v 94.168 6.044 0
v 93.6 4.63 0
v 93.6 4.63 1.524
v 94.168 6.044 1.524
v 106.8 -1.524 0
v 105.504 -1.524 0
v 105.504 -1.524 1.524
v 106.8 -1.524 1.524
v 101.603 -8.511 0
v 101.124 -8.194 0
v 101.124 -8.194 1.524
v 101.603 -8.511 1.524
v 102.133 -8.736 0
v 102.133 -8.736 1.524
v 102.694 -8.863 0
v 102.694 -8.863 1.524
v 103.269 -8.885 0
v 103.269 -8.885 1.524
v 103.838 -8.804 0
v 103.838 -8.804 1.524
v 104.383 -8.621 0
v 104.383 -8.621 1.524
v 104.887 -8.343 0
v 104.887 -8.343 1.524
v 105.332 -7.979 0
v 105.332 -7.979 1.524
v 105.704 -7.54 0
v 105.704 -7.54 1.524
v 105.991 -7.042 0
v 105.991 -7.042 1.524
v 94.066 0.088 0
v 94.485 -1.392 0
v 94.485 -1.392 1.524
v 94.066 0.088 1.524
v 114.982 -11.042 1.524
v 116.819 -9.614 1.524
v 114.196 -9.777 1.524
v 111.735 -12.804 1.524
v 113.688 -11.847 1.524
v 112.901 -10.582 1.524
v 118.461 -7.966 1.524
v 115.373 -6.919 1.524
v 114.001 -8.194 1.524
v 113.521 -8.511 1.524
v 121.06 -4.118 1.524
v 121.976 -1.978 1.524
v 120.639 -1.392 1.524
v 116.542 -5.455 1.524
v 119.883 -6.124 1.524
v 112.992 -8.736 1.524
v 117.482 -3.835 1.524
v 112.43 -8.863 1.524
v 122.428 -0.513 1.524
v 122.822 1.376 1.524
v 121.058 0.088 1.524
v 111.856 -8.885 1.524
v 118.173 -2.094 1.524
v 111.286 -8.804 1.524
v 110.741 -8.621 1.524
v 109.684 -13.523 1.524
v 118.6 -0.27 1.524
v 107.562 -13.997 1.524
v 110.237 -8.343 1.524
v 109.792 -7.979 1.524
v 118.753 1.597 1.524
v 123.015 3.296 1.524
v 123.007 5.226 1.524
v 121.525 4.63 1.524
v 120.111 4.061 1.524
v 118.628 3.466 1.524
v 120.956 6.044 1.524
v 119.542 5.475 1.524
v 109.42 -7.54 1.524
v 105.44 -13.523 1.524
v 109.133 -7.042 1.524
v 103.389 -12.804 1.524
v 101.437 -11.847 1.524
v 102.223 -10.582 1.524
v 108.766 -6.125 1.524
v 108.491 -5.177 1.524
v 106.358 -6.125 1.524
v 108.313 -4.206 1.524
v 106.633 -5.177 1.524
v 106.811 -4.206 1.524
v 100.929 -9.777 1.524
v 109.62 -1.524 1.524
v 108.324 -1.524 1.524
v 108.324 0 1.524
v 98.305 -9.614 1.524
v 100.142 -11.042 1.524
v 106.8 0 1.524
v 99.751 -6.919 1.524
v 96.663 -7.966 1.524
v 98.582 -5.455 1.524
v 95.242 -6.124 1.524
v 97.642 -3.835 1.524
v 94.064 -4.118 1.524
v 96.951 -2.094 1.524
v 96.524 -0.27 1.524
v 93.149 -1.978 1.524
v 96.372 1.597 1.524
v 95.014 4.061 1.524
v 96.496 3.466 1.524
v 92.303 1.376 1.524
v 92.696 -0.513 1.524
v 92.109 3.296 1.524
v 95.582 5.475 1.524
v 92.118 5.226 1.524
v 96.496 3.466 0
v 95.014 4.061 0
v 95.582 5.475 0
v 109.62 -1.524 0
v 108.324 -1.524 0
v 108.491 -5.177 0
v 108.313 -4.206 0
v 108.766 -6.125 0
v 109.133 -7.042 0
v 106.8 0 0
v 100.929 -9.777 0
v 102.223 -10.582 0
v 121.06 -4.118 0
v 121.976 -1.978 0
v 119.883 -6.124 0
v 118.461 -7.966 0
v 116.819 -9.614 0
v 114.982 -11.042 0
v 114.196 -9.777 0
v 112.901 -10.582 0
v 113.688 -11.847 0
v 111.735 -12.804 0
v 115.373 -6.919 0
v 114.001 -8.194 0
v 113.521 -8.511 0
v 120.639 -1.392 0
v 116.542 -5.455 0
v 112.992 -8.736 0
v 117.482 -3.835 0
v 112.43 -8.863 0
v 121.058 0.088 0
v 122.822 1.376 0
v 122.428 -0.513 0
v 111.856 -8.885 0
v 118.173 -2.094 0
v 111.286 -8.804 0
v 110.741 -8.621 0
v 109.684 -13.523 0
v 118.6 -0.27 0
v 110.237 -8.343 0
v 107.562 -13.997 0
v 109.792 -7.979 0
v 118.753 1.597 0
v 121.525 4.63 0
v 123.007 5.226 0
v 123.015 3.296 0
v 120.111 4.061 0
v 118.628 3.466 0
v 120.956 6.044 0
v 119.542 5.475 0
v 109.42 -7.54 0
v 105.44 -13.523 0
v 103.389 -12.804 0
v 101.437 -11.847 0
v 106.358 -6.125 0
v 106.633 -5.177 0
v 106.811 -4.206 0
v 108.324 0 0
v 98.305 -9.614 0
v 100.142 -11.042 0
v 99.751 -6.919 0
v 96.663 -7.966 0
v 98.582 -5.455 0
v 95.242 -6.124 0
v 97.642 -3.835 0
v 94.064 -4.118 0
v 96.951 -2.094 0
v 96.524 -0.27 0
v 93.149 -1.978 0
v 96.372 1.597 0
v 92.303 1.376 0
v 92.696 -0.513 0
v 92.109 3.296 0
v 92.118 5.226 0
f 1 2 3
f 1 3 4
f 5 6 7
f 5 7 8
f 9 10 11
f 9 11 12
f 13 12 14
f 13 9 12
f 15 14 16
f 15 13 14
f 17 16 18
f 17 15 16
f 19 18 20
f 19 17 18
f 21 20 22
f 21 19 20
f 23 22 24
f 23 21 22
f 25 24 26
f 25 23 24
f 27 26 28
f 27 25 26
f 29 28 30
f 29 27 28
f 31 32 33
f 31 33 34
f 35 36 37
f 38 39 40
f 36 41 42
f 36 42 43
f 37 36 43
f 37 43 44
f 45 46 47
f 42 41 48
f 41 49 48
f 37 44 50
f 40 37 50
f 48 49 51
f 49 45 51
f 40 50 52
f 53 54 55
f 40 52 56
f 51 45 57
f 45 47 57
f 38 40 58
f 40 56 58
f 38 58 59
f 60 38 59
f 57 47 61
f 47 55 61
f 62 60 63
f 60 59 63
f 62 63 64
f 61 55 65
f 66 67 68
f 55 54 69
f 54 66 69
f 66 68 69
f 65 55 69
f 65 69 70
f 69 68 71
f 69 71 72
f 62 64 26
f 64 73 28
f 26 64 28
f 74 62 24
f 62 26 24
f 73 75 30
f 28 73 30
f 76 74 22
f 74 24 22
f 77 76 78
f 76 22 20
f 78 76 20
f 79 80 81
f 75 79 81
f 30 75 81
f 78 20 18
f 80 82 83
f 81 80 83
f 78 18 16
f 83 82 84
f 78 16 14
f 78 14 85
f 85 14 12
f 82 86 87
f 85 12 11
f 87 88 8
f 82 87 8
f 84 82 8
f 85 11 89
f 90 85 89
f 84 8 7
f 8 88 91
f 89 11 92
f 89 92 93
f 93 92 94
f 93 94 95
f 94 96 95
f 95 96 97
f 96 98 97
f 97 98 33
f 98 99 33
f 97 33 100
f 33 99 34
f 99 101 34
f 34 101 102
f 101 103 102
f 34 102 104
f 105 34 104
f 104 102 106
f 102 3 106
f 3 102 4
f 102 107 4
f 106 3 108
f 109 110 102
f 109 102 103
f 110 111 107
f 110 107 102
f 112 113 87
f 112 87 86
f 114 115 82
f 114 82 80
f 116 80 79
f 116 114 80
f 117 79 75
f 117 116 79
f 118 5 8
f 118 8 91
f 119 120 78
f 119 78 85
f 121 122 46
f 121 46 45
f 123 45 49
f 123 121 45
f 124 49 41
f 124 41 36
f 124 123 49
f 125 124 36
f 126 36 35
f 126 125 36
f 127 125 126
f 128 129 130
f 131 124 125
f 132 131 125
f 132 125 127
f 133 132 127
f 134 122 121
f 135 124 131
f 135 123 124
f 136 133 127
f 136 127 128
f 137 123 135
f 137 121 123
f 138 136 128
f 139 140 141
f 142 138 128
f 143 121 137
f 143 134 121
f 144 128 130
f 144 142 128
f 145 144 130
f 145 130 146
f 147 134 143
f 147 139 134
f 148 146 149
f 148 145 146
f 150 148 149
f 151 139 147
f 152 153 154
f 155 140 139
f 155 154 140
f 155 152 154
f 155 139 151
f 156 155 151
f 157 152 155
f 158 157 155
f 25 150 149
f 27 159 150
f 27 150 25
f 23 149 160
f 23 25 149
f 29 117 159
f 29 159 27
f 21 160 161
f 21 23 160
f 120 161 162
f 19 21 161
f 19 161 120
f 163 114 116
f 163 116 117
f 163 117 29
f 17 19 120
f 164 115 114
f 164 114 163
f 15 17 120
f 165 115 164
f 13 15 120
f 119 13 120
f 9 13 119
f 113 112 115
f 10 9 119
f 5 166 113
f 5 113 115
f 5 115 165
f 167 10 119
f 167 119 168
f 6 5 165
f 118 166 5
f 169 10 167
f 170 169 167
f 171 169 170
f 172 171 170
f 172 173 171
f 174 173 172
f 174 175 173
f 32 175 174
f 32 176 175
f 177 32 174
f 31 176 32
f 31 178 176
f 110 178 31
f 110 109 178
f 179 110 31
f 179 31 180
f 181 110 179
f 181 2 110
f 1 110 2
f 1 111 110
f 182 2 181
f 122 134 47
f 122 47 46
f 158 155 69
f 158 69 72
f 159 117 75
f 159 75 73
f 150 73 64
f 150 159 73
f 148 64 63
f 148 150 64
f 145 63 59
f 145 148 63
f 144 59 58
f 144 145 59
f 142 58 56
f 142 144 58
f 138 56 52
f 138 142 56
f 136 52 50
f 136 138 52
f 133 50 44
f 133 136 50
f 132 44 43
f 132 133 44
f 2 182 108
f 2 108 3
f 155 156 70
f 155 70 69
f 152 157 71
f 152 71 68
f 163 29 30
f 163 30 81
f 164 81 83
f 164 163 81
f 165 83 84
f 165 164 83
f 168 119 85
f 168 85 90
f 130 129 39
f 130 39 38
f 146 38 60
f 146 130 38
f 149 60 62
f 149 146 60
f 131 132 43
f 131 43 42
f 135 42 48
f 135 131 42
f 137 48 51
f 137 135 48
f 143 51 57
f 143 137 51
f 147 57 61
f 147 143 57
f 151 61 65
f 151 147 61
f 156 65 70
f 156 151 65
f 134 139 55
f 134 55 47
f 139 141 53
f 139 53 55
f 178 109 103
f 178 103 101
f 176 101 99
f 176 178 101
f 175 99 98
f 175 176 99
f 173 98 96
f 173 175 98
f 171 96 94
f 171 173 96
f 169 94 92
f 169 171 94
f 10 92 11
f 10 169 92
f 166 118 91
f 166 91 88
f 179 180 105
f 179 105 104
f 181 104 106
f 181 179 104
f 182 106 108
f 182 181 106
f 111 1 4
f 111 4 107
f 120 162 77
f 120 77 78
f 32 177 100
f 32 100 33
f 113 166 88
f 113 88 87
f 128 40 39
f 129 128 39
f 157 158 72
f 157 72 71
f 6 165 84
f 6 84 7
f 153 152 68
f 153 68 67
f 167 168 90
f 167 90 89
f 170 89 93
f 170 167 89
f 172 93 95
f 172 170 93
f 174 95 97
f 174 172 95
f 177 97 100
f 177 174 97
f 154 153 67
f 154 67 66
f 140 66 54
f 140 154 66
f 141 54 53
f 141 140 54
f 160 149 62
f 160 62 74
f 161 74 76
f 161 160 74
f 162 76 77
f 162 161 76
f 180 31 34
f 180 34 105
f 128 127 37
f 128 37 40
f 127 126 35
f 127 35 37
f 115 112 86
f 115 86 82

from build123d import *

# Parameters (mm, degrees)
BOSS_EXTRUDE1_DEPTH = 1.524


with BuildPart() as part:
    # Sketch1 → Boss-Extrude1 (new body)
    with BuildSketch(Plane.XY):
        with BuildLine():
            Line((106.811293612, -4.205619723), (105.503930304, -1.524))
            Line((105.503930304, -1.524), (106.800157748, -1.524))
            Line((106.800157748, -1.524), (106.800157748, 0))
            Line((106.800157748, 0), (108.32415775, 0))
            Line((108.32415775, 0), (108.32415775, -1.524))
            Line((108.32415775, -1.524), (109.620385194, -1.524))
            Line((109.620385194, -1.524), (108.313021885, -4.205619723))
            ThreePointArc((108.313021885, -4.205619723), (108.616799976, -5.654511508), (109.13336302, -7.041858312))
            ThreePointArc((109.13336302, -7.041858312), (111.286278886, -8.804119786), (114.000740009, -8.193945187))
            ThreePointArc((114.000740009, -8.193945187), (117.860186741, -2.977615774), (118.628372854, 3.4656219))
            Line((118.628372854, 3.4656219), (120.110575877, 4.061475664))
            Line((120.110575877, 4.061475664), (119.542132666, 5.475494164))
            Line((119.542132666, 5.475494164), (120.956151165, 6.043937374))
            Line((120.956151165, 6.043937374), (121.524594376, 4.629918875))
            Line((121.524594376, 4.629918875), (123.006797398, 5.225772639))
            ThreePointArc((123.006797398, 5.225772639), (122.943528087, 2.333705851), (122.428113191, -0.512765789))
            Line((122.428113191, -0.512765789), (121.057887131, 0.088329507))
            Line((121.057887131, 0.088329507), (120.639136812, -1.392165095))
            Line((120.639136812, -1.392165095), (121.97564456, -1.97846873))
            ThreePointArc((121.97564456, -1.97846873), (119.201094938, -7.067703715), (114.981972786, -11.042303895))
            Line((114.981972786, -11.042303895), (114.195536637, -9.777044843))
            Line((114.195536637, -9.777044843), (112.901190835, -10.581560192))
            Line((112.901190835, -10.581560192), (113.687626985, -11.846819244))
            ThreePointArc((113.687626985, -11.846819244), (110.720377701, -13.193789782), (107.562157749, -13.996625182))
            ThreePointArc((107.562157749, -13.996625182), (104.403937797, -13.193789782), (101.436688513, -11.846819244))
            Line((101.436688513, -11.846819244), (102.223124662, -10.581560192))
            Line((102.223124662, -10.581560192), (100.928778861, -9.777044843))
            Line((100.928778861, -9.777044843), (100.142342712, -11.042303895))
            ThreePointArc((100.142342712, -11.042303895), (95.923220559, -7.067703715), (93.148670938, -1.97846873))
            Line((93.148670938, -1.97846873), (94.485178686, -1.392165095))
            Line((94.485178686, -1.392165095), (94.066428367, 0.088329507))
            Line((94.066428367, 0.088329507), (92.696202307, -0.512765789))
            ThreePointArc((92.696202307, -0.512765789), (92.18078741, 2.333705851), (92.117518099, 5.225772639))
            Line((92.117518099, 5.225772639), (93.599721122, 4.629918875))
            Line((93.599721122, 4.629918875), (94.168164333, 6.043937374))
            Line((94.168164333, 6.043937374), (95.582182832, 5.475494164))
            Line((95.582182832, 5.475494164), (95.013739621, 4.061475664))
            Line((95.013739621, 4.061475664), (96.495942644, 3.4656219))
            ThreePointArc((96.495942644, 3.4656219), (97.264128757, -2.977615774), (101.123575488, -8.193945187))
            ThreePointArc((101.123575488, -8.193945187), (103.838036611, -8.804119786), (105.990952478, -7.041858312))
            ThreePointArc((105.990952478, -7.041858312), (106.507515522, -5.654511508), (106.811293612, -4.205619723))
        make_face()
    extrude(amount=BOSS_EXTRUDE1_DEPTH)


solid = part.part
